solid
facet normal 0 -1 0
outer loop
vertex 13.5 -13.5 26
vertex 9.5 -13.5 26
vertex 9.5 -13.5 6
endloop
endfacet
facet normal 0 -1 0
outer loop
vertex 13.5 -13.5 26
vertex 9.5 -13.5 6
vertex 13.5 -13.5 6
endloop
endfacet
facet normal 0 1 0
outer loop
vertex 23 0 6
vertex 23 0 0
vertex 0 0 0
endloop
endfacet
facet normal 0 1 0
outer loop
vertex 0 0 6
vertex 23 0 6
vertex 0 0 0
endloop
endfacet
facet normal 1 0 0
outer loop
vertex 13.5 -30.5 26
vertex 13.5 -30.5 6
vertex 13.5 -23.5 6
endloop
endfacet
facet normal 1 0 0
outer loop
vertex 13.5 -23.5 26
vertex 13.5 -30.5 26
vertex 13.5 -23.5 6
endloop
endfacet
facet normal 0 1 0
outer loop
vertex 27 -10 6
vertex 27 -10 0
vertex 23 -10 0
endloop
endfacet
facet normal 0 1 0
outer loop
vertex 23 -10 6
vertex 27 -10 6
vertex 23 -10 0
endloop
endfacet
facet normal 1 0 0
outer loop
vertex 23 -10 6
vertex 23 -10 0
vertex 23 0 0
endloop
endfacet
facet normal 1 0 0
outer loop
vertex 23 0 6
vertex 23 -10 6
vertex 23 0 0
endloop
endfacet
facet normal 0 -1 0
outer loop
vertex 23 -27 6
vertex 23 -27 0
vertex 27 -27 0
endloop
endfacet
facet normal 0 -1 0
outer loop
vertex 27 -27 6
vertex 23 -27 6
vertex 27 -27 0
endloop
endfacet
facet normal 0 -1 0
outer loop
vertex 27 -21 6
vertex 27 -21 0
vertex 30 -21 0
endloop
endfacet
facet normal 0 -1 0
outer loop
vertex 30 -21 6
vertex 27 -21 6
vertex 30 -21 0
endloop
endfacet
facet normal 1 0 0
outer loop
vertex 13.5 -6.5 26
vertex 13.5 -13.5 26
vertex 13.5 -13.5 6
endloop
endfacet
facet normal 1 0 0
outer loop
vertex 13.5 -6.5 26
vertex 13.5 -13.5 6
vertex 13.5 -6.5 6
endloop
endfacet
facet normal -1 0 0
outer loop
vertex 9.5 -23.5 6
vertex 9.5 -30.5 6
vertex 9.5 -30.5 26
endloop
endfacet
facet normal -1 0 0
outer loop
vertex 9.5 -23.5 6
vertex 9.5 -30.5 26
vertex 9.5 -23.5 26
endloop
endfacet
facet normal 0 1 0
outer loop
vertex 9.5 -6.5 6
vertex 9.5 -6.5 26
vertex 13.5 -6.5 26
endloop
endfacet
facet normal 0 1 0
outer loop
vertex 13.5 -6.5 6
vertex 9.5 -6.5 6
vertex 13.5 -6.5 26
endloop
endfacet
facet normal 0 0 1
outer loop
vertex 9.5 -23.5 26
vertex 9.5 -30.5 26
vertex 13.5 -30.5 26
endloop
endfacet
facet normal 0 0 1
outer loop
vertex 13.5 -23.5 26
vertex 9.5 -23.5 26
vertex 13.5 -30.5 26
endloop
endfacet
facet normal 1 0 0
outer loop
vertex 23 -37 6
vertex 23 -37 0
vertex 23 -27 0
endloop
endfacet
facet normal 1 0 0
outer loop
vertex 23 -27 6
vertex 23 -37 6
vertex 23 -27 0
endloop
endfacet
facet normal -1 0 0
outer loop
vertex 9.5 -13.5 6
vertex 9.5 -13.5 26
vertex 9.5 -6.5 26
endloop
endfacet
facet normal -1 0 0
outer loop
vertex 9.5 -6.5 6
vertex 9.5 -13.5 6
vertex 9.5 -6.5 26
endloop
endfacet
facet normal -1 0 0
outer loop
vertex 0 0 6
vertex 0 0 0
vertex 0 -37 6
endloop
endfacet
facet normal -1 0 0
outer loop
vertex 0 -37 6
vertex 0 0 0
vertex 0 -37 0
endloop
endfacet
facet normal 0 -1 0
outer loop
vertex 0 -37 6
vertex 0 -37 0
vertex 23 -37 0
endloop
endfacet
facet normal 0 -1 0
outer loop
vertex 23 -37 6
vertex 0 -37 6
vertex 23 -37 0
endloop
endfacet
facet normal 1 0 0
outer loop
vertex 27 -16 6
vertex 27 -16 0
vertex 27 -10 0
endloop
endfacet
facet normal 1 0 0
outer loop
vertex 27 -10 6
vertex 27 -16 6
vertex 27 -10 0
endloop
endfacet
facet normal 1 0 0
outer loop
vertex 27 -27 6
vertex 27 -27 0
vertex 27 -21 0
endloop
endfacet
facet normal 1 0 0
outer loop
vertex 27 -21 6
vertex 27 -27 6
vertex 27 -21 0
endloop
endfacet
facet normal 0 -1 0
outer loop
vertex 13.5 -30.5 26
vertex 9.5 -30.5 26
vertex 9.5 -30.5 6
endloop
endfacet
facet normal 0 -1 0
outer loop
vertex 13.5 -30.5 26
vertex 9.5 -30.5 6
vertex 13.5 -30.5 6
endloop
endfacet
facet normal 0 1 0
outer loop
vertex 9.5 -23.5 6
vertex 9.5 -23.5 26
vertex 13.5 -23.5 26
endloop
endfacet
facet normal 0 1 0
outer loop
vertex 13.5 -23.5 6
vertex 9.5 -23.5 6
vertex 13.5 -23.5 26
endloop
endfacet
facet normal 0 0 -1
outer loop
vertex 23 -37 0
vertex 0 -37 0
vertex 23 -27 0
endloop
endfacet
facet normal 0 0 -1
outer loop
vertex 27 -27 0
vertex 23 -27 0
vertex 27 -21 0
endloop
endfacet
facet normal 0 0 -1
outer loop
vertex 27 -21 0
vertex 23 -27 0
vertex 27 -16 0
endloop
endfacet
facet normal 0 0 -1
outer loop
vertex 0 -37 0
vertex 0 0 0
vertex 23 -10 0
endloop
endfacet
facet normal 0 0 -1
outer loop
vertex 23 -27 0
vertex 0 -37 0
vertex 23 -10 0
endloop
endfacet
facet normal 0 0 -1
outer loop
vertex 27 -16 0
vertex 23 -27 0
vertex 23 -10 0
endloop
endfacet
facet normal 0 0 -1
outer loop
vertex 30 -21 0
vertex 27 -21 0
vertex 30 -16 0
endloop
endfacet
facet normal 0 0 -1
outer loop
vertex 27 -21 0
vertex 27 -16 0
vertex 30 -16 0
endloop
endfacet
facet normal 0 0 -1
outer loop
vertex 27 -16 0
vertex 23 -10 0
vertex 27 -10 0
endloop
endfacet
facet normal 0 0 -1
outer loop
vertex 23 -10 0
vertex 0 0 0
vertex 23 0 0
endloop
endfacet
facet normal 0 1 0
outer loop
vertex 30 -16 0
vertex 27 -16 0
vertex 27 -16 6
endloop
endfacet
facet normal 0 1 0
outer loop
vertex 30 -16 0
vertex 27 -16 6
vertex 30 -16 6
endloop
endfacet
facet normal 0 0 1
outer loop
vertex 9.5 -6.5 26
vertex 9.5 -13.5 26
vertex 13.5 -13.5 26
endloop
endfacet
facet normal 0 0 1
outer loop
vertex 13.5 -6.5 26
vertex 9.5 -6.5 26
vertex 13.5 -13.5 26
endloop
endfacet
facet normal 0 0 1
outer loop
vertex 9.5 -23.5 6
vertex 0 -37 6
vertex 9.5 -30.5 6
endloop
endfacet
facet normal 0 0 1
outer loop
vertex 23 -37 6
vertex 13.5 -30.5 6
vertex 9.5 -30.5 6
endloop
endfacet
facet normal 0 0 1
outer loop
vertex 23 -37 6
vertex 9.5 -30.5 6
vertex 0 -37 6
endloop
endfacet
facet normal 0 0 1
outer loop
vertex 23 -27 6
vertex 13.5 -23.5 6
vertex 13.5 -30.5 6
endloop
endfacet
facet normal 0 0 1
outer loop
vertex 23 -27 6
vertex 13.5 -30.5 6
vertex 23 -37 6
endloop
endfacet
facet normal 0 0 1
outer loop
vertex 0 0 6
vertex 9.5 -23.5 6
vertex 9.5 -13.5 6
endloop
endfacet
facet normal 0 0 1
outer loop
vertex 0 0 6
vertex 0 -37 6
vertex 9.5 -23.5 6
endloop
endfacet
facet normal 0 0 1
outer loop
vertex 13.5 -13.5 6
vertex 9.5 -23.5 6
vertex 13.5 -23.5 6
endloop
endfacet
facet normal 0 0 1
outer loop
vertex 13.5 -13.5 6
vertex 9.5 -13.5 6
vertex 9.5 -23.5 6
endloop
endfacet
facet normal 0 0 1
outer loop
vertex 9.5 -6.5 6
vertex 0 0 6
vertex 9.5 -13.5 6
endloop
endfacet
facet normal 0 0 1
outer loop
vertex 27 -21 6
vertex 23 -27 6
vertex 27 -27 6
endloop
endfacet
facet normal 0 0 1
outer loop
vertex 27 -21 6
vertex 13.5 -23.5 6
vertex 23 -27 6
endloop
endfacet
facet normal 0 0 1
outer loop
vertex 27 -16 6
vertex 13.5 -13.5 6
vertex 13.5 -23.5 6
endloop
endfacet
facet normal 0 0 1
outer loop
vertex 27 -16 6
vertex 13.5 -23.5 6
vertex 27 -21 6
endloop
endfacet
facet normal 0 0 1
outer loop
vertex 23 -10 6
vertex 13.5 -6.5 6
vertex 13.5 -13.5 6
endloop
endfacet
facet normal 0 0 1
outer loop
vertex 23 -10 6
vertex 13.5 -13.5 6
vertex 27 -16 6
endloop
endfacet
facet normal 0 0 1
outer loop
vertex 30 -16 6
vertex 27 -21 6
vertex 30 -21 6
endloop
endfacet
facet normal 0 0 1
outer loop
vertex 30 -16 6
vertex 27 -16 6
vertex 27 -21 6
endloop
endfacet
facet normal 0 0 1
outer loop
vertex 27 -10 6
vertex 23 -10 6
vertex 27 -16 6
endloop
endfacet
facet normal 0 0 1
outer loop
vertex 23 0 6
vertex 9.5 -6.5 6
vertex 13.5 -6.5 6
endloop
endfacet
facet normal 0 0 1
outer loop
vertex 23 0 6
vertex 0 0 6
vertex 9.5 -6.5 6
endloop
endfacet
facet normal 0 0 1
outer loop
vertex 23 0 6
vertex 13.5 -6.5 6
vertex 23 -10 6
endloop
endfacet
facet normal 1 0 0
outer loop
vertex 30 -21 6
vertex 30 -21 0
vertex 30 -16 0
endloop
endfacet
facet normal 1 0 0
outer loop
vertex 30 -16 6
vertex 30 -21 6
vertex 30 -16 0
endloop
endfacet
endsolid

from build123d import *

# Parameters (mm, degrees)
F0_W     = 4
F0_H     = 7
F0_W_2   = 3
F0_H_2   = 5
F1_DEPTH = 6
F2_DEPTH = 26


with BuildPart() as f1:
    # F0 (on Top) → F1 (new body)
    with BuildSketch(Plane.XY):
        Polygon((23, 0), (0, 0), (0, -37), (23, -37), (23, -27), (23, -10), align=None)
        with Locations((11.5, -27)):
            Rectangle(F0_W, F0_H, mode=Mode.SUBTRACT)
        with Locations((11.5, -10)):
            Rectangle(F0_W, F0_H, mode=Mode.SUBTRACT)
        Polygon((27, -10), (23, -10), (23, -27), (27, -27), (27, -21), (27, -16), align=None)
        with Locations((28.5, -18.5)):
            Rectangle(F0_W_2, F0_H_2)
    extrude(amount=F1_DEPTH)

    # F0 (on Top) → F2 (join)
    with BuildSketch(Plane.XY):
        with Locations((11.5, -10)):
            Rectangle(F0_W, F0_H)
        with Locations((11.5, -27)):
            Rectangle(F0_W, F0_H)
    extrude(amount=F2_DEPTH)


solid = f1.part
